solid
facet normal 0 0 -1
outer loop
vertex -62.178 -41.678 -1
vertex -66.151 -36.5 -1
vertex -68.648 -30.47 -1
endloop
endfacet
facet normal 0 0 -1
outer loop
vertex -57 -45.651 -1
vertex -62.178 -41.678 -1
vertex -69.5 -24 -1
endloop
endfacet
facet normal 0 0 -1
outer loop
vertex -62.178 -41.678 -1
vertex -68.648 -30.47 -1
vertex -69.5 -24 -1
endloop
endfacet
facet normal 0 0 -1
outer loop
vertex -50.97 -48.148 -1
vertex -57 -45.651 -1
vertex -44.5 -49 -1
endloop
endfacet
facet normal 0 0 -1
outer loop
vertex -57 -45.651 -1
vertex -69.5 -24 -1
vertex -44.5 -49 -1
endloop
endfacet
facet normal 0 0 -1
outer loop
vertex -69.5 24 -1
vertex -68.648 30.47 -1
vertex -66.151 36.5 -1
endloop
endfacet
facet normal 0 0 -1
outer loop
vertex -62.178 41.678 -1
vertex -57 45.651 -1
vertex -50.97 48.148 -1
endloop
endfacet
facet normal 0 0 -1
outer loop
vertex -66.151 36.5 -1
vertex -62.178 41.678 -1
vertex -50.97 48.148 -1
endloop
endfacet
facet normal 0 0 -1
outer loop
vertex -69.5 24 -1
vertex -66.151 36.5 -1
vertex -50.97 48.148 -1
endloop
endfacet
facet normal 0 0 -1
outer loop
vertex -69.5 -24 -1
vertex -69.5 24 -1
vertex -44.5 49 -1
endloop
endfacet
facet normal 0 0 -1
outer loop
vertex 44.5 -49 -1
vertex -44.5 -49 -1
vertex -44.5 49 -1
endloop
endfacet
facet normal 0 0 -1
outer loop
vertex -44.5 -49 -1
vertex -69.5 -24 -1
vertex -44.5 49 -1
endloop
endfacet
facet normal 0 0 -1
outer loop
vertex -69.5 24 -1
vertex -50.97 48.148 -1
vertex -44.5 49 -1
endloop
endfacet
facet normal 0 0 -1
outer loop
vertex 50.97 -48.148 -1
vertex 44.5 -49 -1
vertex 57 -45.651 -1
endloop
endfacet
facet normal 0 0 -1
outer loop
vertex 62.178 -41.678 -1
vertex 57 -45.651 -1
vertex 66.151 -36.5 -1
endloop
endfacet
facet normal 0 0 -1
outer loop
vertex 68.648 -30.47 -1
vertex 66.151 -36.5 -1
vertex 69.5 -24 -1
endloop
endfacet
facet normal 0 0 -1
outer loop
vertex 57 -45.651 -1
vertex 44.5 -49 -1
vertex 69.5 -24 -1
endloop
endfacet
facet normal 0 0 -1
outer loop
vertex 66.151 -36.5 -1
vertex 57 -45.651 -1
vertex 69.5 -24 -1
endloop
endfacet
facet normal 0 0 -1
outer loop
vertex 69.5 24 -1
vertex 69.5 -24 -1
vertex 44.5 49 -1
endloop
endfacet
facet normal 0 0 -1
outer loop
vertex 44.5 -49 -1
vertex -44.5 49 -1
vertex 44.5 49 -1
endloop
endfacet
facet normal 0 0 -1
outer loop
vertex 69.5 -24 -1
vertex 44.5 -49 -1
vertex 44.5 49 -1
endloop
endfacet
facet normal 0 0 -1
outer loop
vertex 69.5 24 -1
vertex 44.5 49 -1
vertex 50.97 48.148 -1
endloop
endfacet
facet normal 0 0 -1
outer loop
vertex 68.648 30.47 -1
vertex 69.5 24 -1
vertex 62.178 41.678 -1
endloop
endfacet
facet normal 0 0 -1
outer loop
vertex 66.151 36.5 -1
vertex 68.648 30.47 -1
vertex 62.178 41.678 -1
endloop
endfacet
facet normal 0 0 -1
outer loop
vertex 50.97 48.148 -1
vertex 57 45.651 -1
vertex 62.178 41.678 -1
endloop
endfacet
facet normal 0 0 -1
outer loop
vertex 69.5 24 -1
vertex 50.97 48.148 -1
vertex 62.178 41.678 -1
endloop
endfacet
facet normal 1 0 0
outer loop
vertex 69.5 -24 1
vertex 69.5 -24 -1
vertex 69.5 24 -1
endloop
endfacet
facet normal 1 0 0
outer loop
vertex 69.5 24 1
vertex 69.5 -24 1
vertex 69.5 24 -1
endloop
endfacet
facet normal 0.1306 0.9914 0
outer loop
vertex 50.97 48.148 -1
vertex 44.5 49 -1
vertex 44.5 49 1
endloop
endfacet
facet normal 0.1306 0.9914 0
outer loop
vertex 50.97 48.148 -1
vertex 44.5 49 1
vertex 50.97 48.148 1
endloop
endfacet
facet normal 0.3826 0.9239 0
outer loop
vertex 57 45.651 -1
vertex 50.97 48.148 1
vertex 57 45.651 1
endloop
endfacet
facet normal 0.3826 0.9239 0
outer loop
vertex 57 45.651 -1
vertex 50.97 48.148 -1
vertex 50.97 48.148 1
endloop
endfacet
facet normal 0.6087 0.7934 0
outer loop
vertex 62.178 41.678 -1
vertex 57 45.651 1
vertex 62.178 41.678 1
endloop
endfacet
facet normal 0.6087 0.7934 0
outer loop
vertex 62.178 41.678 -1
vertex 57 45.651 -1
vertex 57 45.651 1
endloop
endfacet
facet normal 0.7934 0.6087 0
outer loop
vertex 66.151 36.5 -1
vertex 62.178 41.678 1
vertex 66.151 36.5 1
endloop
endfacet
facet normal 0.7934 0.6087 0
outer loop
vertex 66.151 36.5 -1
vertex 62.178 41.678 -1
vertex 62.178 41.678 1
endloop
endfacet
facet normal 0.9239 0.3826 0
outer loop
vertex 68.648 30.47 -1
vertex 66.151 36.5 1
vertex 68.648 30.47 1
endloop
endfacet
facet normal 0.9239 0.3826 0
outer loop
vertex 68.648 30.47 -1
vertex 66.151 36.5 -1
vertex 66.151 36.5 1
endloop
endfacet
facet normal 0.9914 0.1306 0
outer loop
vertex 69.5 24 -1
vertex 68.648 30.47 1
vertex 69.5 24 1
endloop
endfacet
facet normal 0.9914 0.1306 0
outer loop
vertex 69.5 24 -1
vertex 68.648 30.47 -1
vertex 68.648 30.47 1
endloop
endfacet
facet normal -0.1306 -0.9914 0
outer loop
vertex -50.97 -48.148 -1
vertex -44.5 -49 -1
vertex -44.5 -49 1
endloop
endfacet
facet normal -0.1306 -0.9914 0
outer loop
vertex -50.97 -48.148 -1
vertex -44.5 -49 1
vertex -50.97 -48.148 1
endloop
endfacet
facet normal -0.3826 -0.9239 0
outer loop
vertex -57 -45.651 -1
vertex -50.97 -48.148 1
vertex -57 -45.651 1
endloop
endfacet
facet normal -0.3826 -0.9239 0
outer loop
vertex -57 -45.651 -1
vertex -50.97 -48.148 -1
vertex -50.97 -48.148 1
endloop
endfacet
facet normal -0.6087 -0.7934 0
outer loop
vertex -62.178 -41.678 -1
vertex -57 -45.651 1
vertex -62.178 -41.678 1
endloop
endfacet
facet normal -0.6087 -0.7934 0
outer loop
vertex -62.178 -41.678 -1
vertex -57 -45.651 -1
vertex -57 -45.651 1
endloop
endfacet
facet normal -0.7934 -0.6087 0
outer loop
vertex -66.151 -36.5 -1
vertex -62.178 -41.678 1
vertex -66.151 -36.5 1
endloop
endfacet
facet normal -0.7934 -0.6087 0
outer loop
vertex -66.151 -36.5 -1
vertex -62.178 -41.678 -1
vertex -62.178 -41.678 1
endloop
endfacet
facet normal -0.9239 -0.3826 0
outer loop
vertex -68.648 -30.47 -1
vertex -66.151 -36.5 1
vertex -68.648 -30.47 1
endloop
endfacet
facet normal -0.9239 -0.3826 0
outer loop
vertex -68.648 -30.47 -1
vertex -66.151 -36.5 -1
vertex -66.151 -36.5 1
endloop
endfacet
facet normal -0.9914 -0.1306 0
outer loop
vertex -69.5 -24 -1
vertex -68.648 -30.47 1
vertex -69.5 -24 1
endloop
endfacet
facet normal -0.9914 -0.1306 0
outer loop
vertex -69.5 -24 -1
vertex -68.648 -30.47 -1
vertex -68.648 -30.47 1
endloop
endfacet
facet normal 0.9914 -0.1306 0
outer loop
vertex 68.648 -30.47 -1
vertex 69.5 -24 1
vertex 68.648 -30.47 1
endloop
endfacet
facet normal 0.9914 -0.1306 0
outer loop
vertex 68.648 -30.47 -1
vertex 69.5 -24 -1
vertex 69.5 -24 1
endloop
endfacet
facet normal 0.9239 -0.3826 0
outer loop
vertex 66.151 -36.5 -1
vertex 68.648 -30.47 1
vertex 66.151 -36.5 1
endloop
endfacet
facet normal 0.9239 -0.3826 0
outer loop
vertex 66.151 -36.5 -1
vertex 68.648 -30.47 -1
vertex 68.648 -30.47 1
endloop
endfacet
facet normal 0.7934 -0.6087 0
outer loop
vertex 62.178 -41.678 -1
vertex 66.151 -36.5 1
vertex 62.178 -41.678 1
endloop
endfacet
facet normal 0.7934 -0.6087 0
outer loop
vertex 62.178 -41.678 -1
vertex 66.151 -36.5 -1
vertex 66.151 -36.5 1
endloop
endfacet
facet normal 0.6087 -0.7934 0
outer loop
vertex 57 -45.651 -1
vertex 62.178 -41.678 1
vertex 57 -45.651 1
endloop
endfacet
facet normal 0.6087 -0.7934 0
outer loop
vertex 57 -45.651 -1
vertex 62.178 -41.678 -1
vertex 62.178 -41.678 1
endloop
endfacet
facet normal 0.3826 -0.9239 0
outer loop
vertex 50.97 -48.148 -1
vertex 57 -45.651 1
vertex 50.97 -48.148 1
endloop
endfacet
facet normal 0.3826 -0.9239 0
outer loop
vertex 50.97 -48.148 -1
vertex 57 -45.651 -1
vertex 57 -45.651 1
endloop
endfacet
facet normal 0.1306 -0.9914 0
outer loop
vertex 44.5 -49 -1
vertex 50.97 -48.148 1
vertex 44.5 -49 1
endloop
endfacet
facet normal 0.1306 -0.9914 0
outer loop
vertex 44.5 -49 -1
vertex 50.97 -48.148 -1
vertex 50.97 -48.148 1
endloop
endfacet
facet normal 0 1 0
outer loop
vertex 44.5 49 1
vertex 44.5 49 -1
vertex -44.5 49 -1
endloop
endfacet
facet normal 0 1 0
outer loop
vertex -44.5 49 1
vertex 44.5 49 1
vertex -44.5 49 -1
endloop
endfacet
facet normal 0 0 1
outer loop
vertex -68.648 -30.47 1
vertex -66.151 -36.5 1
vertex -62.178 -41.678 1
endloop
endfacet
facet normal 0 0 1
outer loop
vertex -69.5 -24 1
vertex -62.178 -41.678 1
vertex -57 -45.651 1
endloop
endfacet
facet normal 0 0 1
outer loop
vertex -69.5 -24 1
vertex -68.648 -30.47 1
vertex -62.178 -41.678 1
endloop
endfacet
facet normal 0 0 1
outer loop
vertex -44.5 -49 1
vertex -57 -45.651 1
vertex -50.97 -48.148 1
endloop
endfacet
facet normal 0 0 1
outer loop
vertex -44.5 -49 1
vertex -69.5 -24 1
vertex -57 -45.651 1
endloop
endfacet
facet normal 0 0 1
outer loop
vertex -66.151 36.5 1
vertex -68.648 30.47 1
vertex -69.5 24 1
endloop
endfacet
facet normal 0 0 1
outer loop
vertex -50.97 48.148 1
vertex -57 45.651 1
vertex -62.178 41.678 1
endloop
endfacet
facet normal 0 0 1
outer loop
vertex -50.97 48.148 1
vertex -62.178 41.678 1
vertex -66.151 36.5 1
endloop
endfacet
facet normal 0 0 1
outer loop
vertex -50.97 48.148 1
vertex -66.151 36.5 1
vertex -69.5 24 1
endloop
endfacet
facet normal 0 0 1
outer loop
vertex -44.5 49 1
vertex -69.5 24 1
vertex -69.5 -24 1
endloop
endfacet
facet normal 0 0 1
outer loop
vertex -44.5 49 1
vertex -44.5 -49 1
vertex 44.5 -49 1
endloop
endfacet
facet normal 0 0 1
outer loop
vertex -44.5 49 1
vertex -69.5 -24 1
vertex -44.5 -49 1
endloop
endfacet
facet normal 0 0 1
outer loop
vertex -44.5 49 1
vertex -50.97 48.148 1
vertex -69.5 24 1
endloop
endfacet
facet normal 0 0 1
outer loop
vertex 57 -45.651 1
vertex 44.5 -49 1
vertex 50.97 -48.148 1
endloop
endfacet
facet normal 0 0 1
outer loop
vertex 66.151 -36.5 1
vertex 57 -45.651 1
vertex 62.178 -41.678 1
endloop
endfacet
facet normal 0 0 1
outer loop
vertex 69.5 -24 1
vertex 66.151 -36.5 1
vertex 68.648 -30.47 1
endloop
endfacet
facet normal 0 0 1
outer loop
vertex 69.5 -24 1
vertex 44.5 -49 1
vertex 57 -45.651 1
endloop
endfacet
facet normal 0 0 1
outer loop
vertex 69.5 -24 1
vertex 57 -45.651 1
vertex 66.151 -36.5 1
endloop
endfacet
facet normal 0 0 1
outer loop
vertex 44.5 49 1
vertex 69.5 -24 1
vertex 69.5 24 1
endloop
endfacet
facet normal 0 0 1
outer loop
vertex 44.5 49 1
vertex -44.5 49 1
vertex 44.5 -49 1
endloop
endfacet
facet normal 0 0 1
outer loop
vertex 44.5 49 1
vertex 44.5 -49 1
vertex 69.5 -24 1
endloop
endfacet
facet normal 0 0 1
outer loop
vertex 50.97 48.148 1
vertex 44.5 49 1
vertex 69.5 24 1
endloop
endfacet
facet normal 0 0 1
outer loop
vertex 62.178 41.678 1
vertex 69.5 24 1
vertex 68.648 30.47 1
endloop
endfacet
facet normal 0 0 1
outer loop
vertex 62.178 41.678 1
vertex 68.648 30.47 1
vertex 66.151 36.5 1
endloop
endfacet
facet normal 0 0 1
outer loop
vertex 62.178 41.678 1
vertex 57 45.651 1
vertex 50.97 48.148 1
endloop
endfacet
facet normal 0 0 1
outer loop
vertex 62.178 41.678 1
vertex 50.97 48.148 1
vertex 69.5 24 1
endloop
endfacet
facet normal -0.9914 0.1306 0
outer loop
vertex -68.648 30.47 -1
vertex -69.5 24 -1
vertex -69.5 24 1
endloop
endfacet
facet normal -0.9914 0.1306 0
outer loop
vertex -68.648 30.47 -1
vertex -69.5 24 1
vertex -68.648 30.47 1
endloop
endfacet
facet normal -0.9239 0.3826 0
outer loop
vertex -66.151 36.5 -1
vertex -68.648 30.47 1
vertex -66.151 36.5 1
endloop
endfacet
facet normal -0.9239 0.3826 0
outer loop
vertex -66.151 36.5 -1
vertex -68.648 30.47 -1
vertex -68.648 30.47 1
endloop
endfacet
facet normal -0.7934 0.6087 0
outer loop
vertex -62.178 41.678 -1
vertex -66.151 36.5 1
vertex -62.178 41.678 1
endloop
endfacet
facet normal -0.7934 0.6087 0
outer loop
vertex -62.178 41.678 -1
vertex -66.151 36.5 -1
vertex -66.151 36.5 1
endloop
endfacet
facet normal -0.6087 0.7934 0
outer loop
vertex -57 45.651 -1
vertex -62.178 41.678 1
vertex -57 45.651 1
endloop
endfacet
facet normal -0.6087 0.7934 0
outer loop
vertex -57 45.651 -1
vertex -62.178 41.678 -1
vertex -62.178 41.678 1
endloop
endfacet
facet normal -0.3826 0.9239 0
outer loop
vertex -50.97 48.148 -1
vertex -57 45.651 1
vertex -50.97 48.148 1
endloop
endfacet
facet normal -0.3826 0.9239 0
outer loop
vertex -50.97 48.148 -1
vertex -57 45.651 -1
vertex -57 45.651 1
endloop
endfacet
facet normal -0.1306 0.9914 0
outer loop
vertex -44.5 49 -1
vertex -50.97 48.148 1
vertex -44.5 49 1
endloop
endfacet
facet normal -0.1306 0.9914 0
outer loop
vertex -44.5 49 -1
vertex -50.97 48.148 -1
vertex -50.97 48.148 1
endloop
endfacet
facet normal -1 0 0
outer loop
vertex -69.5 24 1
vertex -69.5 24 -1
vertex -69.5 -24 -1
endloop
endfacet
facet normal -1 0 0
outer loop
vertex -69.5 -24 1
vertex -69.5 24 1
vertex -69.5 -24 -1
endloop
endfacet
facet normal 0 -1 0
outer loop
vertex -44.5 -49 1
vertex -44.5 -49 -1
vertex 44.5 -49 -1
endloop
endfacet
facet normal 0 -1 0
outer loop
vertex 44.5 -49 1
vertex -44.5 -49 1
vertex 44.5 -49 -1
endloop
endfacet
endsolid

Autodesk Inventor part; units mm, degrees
ref_plane "YZ Plane" through (0, 0, 0) normal (1, 0, 0) x (0, 1, 0)
ref_plane "XZ Plane" through (0, 0, 0) normal (0, 1, 0) x (-1, 0, 0)
ref_plane "XY Plane" through (0, 0, 0) normal (0, 0, 1) x (1, 0, 0)
sketch "Sketch1" plane through (0, 0, 0) normal (0, 0, 1) x (1, 0, 0)
  line L0 (-44.5, -49) -> (44.5, -49)
  line L1 (69.5, -24) -> (69.5, 24)
  line L2 (44.5, 49) -> (-44.5, 49)
  line L3 (-69.5, 24) -> (-69.5, -24)
  line L4 (-69.5, -49) -> (69.5, 49) construction
  line L5 (69.5, -49) -> (-69.5, 49) construction
  arc A0 (69.5, 24) -> (44.5, 49) centre (44.5, 24) ccw
  arc A1 (44.5, -49) -> (69.5, -24) centre (44.5, -24) ccw
  arc A2 (-69.5, -24) -> (-44.5, -49) centre (-44.5, -24) ccw
  arc A3 (-44.5, 49) -> (-69.5, 24) centre (-44.5, 24) ccw
  point P0 (0, 0)
  dimension "d0" = 139
  dimension "d1" = 98
  dimension "d2" = 25
extrude "Extrusion1" add sketch "Sketch1" along normal mid plane 2
properties part number "Game_ColonyPort"
